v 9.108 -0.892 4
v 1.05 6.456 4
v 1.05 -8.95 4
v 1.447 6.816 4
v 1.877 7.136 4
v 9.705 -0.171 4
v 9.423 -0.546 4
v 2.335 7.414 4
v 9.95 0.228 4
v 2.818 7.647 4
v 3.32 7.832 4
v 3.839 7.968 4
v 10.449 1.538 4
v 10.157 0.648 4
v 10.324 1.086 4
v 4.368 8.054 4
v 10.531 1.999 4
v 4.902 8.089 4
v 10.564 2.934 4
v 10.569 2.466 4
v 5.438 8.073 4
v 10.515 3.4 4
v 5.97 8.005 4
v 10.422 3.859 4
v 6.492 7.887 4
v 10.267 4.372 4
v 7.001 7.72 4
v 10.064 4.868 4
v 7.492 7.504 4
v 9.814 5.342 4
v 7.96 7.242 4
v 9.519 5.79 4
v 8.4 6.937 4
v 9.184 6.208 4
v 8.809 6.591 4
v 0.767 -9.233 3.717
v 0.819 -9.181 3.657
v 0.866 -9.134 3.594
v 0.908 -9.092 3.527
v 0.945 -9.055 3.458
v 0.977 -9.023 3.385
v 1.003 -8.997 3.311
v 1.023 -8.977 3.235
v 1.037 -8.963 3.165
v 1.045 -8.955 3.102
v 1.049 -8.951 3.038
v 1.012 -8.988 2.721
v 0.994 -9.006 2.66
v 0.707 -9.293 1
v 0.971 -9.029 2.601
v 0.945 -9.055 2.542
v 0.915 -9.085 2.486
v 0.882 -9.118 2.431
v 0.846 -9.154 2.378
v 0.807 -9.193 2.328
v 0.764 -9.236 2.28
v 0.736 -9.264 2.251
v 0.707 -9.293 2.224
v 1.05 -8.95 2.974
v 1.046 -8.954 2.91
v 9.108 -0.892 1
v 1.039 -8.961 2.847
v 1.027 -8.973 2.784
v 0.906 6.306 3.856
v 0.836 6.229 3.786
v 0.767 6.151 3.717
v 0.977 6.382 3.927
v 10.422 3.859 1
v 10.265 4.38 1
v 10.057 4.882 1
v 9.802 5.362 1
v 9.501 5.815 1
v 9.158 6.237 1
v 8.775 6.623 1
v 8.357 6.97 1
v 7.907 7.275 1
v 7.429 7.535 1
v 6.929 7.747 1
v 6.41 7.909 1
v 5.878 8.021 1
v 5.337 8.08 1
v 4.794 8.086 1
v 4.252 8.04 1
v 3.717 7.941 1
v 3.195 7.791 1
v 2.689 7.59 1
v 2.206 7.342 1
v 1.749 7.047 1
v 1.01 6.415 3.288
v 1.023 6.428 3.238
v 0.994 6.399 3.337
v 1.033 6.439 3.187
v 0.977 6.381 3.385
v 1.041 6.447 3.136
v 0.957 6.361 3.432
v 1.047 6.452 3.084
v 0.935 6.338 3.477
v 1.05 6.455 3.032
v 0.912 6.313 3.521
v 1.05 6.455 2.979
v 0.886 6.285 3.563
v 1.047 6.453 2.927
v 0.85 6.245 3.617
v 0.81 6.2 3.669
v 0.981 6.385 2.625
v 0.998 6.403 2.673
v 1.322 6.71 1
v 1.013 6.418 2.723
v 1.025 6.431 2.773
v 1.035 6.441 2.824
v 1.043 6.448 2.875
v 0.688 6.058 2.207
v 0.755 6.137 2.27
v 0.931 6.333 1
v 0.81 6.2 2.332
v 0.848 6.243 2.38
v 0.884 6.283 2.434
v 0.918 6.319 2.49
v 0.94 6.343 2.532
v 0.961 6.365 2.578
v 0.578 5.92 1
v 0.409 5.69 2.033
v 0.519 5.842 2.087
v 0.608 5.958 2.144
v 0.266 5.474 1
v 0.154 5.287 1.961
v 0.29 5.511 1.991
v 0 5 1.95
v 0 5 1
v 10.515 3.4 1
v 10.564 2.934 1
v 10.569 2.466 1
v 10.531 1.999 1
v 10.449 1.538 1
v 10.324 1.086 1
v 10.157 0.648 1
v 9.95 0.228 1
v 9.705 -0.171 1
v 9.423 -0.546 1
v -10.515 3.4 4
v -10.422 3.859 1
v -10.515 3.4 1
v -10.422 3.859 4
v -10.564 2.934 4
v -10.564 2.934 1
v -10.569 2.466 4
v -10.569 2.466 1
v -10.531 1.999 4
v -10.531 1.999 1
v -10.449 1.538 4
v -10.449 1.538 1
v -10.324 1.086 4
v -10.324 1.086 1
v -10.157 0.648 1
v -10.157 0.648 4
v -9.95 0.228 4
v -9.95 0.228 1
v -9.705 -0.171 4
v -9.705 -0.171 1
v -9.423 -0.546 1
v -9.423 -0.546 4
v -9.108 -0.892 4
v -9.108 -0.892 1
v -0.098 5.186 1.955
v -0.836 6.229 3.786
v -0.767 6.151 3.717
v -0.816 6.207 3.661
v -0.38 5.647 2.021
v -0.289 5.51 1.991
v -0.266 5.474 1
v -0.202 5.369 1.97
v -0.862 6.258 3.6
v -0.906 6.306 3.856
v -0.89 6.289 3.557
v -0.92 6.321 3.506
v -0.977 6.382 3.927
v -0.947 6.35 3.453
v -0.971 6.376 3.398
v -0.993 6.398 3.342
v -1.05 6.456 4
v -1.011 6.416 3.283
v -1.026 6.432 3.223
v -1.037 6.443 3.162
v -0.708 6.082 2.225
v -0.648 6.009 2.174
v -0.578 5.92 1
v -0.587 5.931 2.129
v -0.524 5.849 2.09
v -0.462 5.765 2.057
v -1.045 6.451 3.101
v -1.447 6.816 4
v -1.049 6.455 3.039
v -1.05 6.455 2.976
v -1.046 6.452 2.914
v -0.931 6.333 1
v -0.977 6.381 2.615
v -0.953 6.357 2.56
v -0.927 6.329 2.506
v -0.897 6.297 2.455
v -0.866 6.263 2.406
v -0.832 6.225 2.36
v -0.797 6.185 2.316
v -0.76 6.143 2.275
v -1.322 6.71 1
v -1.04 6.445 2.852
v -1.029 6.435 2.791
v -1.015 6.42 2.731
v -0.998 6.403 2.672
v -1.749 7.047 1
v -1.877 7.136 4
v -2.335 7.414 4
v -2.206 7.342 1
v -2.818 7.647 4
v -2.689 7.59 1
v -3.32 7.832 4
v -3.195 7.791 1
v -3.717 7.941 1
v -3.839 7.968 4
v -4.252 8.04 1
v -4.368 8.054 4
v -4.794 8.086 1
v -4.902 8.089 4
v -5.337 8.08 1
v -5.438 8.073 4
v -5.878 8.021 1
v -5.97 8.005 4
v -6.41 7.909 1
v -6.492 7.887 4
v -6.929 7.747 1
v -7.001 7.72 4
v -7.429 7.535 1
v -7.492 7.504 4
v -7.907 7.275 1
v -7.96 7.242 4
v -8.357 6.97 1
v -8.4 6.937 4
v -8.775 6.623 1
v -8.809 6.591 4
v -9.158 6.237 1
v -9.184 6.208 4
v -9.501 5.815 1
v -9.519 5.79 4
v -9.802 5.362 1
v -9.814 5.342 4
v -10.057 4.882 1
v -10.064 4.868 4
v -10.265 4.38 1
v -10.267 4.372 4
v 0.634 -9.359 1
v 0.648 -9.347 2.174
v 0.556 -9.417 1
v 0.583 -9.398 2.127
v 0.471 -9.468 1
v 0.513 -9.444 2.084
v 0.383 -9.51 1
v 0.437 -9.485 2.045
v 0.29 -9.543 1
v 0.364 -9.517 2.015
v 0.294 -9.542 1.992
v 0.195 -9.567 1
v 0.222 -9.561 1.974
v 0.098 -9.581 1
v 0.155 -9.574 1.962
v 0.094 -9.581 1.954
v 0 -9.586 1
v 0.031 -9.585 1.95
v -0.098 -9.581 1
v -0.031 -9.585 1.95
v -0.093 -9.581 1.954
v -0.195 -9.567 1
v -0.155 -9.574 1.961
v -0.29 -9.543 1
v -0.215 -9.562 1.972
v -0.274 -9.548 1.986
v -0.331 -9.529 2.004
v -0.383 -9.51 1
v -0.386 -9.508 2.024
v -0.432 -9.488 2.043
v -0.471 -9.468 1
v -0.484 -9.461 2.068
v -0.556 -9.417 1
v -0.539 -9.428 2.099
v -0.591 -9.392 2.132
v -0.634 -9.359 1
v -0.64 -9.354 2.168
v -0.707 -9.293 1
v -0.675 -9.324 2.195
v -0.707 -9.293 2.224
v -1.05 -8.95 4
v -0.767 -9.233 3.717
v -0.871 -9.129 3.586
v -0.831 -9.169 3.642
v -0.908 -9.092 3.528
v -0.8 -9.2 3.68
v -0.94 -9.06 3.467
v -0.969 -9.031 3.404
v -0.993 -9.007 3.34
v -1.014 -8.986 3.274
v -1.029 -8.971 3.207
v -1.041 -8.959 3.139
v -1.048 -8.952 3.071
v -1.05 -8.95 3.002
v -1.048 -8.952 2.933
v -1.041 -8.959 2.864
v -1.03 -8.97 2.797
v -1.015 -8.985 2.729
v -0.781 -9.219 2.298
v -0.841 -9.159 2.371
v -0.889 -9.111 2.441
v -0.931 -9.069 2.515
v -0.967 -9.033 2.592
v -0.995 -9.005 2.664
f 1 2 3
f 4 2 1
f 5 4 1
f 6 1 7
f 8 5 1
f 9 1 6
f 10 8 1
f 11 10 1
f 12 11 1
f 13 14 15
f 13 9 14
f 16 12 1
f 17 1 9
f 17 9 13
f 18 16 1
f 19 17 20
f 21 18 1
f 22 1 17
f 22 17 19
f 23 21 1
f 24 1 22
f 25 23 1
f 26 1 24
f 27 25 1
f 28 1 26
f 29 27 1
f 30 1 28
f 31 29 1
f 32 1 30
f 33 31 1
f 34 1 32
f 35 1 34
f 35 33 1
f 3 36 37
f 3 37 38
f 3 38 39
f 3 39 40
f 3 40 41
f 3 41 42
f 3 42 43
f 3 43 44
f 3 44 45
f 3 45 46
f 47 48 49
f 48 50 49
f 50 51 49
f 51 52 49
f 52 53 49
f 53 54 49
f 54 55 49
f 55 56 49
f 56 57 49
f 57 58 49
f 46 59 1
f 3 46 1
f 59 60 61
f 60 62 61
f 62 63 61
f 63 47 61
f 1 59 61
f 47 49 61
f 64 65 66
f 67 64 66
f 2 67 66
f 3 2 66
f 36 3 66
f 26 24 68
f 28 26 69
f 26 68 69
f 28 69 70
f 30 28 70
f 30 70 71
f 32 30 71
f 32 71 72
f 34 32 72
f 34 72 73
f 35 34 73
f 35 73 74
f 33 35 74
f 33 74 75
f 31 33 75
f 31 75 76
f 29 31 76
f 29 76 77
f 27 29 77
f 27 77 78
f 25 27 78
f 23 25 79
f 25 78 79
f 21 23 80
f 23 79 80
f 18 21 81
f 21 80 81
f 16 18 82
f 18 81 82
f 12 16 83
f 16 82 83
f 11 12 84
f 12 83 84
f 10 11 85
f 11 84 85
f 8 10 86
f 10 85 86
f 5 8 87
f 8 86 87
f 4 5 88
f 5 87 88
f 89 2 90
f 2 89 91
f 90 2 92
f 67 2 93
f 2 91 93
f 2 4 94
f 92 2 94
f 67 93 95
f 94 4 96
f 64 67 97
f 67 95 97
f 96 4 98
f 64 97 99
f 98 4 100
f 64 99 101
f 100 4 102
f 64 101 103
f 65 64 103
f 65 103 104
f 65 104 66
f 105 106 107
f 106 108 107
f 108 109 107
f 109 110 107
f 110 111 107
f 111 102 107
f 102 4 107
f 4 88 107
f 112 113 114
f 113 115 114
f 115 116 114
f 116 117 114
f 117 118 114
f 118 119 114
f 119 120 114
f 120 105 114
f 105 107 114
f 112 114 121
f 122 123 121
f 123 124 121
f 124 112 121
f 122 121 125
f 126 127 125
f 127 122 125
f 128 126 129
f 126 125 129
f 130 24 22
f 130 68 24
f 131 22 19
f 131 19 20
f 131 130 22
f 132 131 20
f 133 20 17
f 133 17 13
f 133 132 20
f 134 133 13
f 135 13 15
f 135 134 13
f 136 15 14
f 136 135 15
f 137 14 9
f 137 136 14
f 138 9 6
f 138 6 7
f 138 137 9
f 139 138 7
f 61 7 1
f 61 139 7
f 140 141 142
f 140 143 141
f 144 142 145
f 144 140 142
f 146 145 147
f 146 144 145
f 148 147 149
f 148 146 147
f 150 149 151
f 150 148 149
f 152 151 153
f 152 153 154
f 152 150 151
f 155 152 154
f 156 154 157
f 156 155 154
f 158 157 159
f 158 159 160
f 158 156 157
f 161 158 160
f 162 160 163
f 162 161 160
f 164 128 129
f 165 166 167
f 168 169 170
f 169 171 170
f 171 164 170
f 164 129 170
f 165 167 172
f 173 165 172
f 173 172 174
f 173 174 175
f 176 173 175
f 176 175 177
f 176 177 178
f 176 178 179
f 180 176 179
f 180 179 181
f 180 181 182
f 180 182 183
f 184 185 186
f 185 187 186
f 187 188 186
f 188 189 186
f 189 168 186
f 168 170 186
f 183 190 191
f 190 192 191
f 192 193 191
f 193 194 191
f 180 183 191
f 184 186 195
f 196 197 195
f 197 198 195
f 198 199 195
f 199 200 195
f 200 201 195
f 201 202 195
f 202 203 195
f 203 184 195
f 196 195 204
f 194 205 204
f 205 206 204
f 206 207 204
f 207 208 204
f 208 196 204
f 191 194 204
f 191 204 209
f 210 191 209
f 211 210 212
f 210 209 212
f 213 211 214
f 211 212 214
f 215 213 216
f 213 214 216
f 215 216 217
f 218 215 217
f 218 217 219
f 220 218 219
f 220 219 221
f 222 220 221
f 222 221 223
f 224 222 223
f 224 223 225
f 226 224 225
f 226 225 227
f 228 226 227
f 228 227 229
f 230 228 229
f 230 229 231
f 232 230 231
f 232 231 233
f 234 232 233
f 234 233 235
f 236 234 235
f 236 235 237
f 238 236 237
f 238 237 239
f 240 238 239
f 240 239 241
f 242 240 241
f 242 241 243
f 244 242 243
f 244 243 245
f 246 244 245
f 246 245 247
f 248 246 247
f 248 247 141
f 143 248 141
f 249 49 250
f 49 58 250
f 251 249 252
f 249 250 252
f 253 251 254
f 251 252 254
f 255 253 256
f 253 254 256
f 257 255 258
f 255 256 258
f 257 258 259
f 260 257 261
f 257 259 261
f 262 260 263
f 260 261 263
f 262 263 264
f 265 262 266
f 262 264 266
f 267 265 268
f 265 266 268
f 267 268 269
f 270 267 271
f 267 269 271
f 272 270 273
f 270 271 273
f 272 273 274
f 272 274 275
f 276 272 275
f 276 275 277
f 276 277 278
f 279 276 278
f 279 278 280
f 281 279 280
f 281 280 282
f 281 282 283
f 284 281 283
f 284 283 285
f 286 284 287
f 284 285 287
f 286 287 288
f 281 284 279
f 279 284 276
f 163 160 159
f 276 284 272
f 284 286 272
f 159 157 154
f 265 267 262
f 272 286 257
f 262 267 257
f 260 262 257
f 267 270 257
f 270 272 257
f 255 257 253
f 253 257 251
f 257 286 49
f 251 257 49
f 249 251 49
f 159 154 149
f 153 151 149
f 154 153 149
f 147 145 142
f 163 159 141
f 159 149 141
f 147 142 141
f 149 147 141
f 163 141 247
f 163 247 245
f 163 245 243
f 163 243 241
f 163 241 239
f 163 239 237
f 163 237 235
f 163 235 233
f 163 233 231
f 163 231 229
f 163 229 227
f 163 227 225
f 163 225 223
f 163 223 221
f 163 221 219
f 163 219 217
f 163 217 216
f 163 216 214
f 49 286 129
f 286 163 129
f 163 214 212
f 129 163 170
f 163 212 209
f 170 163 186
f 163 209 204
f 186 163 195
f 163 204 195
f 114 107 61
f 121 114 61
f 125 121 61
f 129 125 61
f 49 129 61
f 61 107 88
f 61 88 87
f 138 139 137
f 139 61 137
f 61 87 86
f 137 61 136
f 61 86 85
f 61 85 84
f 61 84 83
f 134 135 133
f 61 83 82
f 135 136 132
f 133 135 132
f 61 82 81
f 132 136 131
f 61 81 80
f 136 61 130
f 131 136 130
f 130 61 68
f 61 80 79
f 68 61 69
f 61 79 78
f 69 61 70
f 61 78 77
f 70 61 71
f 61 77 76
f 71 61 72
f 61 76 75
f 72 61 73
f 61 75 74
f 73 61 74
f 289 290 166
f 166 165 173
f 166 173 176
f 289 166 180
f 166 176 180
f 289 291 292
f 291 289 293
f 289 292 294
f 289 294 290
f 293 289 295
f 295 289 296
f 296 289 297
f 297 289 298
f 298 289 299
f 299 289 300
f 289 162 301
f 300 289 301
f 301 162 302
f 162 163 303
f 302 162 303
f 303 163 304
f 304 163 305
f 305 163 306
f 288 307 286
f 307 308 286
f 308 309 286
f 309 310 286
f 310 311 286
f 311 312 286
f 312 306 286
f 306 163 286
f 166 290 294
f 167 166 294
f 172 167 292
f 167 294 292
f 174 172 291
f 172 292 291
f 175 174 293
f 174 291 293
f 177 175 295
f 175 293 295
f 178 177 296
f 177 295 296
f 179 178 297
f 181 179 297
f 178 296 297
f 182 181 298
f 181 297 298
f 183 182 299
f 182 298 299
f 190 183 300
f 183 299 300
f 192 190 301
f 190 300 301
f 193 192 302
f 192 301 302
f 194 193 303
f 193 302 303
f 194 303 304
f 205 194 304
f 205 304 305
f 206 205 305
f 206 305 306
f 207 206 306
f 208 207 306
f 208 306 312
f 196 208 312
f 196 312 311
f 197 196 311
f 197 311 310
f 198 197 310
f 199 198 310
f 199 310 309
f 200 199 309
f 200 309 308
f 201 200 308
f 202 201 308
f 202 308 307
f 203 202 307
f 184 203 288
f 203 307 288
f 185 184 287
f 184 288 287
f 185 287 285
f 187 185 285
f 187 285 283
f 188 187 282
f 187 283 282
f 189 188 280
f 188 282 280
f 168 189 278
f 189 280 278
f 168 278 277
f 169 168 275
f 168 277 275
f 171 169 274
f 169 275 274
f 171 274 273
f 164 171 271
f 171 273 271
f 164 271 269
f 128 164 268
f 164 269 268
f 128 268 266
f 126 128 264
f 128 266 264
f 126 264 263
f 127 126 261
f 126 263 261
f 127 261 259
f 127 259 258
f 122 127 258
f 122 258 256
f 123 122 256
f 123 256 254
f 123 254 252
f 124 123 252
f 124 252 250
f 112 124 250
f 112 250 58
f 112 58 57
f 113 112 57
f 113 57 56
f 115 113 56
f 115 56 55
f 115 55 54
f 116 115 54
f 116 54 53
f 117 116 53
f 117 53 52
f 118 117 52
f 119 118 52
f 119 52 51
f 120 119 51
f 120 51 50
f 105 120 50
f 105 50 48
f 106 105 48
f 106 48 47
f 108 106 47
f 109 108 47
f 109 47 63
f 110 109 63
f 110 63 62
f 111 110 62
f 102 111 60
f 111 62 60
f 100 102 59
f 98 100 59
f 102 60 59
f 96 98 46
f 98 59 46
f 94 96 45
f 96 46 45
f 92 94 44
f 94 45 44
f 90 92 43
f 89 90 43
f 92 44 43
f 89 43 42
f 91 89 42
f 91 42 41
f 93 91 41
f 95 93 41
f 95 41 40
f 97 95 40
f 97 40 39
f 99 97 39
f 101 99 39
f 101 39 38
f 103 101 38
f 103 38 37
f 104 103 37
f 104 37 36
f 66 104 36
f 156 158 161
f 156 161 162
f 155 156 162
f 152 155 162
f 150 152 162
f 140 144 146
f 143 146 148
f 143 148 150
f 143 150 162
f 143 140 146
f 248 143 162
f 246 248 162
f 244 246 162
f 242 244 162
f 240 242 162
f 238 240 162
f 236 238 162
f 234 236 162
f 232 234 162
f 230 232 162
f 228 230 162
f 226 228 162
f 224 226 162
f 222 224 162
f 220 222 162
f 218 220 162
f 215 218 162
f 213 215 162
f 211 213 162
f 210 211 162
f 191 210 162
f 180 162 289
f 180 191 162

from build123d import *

# Parameters (mm, degrees)
F1_DEPTH      = 3
F2_W          = 4
F2_H          = 6.1803398875
F3_DEPTH      = 1
F5_DEPTH      = 8.0911699437
F5_DEPTH_BACK = 10.001
F6_T1_DEPTH   = 16.9244695544
F7_DEPTH      = 1
F8_R          = 5
F9_R          = 1


# Not quite as in the source:
# - a fillet or chamfer that OpenCascade refuses, or shapes differently, is made with other operations: its cross-section is extruded or revolved along the edge and cut away or added


with BuildPart() as f1:
    # F0 (on Top) → F1 (new body)
    with BuildSketch(Plane.XY):
        with BuildLine():
            ThreePointArc((10, 0), (7.5, 7.5), (0, 5))
            ThreePointArc((0, 5), (-7.5, 7.5), (-10, 0))
            Line((-10, 0), (0, -10))
            Line((0, -10), (10, 0))
        make_face()
    extrude(amount=F1_DEPTH)

    # F2 (on face) → F3 (join)
    with BuildSketch(Plane.XY.offset(3)):
        with BuildLine():
            ThreePointArc((0, 5), (-7.5, 7.5), (-10, 0))
            Line((-10, 0), (0, -10))
            Line((0, -10), (10, 0))
            ThreePointArc((10, 0), (7.5, 7.5), (0, 5))
        make_face()
        Rectangle(F2_W, F2_H, mode=Mode.SUBTRACT)
        Rectangle(F2_W, F2_H)
    extrude(amount=F3_DEPTH)

    # F4 (on Front) → F5 (cut, two sides)
    with BuildSketch(Plane.XZ) as f5_sk:
        with BuildLine():
            Line((0.75, 4), (-0.75, 4))
            Line((-0.75, 4), (-0.75, 3.7348469228))
            ThreePointArc((-0.75, 3.7348469228), (0, 1.95), (0.75, 3.7348469228))
            Line((0.75, 3.7348469228), (0.75, 4))
        make_face()
    extrude(amount=-F5_DEPTH, mode=Mode.SUBTRACT)
    extrude(f5_sk.sketch, amount=F5_DEPTH_BACK, mode=Mode.SUBTRACT)

    # F6: chamfer of 0.3 on 2 edges, made by hand

    # F6_s2 → F6_t1 (cut)
    with BuildSketch(Plane.XZ.offset(-6.902964658)):
        Polygon((1.05, 4), (0.75, 3.7), (0.75, 4), align=None)
        Polygon((-0.75, 3.7), (-1.05, 4), (-0.75, 4), align=None)
    extrude(amount=F6_T1_DEPTH, mode=Mode.SUBTRACT)

    # F7 (cut): a face of the model
    f7_faces = [f1.faces().sort_by_distance(p)[0] for p in [
        (0, 0.8210756438, 0),
    ]]
    extrude(f7_faces, amount=-F7_DEPTH, mode=Mode.SUBTRACT)

    # F8
    f8_edges = [f1.edges().sort_by_distance(p)[0] for p in [
        (10, 0, 2.5),
        (-10, 0, 2.5),
    ]]
    fillet(f8_edges, radius=F8_R)

    # F9
    f9_edges = [f1.edges().sort_by_distance(p)[0] for p in [
        (0, -10, 1.475),
    ]]
    fillet(f9_edges, radius=F9_R)


solid = f1.part
